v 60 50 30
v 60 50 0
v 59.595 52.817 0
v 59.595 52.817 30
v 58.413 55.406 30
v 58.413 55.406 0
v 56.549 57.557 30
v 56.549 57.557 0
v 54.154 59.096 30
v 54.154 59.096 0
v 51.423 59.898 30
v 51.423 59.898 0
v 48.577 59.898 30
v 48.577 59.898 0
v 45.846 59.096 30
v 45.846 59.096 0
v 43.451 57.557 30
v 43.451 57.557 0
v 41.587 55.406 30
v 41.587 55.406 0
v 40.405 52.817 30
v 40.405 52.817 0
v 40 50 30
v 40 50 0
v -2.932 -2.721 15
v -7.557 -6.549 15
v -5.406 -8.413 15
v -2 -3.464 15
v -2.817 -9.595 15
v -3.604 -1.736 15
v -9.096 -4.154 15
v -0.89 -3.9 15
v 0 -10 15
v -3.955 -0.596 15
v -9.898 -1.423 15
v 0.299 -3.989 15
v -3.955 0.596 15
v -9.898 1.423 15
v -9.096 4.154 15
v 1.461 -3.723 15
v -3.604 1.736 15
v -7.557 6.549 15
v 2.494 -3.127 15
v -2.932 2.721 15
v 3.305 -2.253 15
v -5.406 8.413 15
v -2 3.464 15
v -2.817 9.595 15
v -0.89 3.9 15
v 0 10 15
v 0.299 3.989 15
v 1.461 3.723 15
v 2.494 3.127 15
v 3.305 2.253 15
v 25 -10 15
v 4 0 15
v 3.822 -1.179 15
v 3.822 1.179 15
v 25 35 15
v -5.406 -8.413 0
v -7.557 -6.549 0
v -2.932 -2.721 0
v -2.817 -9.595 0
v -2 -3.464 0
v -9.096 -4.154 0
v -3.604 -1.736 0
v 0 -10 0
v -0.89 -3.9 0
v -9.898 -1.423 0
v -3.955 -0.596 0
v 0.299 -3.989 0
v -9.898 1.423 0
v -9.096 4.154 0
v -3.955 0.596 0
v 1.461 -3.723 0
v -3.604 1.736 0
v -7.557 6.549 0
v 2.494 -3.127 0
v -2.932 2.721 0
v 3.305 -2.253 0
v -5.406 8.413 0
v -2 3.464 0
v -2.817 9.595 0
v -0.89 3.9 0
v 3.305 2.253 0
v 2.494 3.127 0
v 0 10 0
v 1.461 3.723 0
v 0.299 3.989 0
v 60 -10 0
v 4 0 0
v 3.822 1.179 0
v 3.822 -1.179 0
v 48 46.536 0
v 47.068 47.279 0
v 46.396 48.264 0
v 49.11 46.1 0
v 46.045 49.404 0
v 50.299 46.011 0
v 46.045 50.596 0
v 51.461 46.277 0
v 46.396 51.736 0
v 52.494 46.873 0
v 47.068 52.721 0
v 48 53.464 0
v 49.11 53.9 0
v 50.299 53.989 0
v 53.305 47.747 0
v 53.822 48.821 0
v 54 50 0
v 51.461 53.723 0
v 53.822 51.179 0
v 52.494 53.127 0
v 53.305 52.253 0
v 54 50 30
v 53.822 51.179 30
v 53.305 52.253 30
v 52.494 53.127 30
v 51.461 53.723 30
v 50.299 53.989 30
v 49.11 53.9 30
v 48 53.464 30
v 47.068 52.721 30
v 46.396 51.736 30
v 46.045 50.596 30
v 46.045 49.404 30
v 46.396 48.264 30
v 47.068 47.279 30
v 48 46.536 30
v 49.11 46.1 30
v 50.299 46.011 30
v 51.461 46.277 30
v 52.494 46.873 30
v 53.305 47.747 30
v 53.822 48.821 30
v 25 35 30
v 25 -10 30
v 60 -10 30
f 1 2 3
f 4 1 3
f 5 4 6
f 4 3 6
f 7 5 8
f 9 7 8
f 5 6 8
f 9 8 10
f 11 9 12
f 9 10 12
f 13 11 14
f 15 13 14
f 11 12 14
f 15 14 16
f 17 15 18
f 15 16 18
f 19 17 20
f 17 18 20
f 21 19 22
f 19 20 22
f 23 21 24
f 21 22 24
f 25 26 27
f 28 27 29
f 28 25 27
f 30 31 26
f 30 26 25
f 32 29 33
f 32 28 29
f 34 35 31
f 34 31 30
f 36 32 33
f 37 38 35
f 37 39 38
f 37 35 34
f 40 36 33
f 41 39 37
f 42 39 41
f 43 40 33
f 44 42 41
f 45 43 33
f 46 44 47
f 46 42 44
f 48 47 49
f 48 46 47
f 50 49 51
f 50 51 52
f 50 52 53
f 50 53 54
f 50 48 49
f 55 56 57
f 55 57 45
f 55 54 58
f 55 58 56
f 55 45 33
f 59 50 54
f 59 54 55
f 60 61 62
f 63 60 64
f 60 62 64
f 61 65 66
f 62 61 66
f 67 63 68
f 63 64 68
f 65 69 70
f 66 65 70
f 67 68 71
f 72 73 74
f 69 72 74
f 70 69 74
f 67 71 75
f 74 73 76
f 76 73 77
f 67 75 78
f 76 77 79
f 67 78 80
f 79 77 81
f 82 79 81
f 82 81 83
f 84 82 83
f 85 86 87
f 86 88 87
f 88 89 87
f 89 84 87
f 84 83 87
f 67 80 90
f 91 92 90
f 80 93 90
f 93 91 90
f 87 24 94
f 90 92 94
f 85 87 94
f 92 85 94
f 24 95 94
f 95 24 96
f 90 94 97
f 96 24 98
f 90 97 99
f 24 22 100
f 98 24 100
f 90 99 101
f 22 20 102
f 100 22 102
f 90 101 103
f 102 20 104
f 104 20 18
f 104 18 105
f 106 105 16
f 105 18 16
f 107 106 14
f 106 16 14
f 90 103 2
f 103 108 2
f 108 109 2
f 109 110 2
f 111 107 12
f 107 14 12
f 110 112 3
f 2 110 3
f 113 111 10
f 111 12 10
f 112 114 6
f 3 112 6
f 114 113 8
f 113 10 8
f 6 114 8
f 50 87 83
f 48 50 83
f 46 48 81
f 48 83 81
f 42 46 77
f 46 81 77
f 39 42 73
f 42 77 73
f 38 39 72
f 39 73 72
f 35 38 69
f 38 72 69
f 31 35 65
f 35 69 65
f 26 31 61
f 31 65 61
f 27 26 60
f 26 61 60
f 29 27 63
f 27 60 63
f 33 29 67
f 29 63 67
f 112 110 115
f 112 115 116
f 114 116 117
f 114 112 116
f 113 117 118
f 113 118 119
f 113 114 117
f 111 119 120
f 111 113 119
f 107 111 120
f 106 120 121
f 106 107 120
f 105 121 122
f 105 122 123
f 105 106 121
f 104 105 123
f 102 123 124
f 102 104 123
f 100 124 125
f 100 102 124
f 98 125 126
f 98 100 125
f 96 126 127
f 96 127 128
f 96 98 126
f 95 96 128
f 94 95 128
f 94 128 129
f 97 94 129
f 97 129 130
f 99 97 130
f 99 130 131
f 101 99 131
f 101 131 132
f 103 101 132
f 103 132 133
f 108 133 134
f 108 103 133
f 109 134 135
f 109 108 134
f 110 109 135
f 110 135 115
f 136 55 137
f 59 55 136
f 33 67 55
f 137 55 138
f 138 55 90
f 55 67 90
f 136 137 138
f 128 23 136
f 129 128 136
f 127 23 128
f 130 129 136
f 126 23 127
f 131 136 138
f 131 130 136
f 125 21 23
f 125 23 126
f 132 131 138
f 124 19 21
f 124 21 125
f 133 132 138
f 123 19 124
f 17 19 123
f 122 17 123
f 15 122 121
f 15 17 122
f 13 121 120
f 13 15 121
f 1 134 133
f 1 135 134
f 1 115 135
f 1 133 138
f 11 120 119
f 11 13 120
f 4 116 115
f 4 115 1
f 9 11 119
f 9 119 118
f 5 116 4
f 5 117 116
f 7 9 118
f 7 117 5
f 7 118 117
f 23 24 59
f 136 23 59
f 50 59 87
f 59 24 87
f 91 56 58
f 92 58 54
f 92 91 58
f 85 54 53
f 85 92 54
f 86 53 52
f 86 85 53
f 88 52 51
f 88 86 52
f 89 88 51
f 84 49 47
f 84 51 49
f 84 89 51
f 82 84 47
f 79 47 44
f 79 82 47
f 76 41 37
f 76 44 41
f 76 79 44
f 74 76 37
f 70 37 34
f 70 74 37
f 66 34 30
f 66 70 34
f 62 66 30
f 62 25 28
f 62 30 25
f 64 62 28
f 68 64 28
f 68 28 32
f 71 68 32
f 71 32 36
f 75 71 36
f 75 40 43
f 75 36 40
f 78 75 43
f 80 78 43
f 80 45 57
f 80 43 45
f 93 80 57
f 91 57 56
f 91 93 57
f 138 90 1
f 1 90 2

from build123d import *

# Parameters (mm, degrees)
SKETCH1_R           = 4
BOSS_EXTRUDE1_DEPTH = 30
CUT_EXTRUDE3_START  = -15
CUT_EXTRUDE3_DEPTH  = 15


with BuildPart() as part:
    # Sketch1 → Boss-Extrude1 (new body)
    with BuildSketch(Plane.XY):
        with BuildLine():
            Line((0, -10), (60, -10))
            Line((60, -10), (60, 50))
            ThreePointArc((60, 50), (50, 60), (40, 50))
            Line((40, 50), (0, 10))
            ThreePointArc((0, 10), (-10, 0), (0, -10))
        make_face()
        with Locations((50, 50)):
            Circle(SKETCH1_R, mode=Mode.SUBTRACT)
        Circle(SKETCH1_R, mode=Mode.SUBTRACT)
    extrude(amount=BOSS_EXTRUDE1_DEPTH)

    # Sketch3 → Cut-Extrude3 (cut)
    with BuildSketch(Plane.XY.offset(30).offset(CUT_EXTRUDE3_START)):
        with BuildLine():
            Line((60, -217.989898732), (60, -10))
            Line((60, -10), (60, 50))
            ThreePointArc((60, 50), (50, 60), (40, 50))
            Line((40, 50), (0, 10))
            ThreePointArc((0, 10), (-10, 0), (0, -10))
            Line((0, -10), (60, -10))
            Line((60, -10), (25, -10))
            Line((25, -10), (25, 35))
            Line((25, 35), (25, 242.989898732))
            Line((25, 242.989898732), (-389.785969286, 211.497176047))
            Line((-389.785969286, 211.497176047), (-354.785969286, -249.482621417))
            Line((-354.785969286, -249.482621417), (60, -217.989898732))
        make_face()
    extrude(amount=CUT_EXTRUDE3_DEPTH, mode=Mode.SUBTRACT)


solid = part.part
